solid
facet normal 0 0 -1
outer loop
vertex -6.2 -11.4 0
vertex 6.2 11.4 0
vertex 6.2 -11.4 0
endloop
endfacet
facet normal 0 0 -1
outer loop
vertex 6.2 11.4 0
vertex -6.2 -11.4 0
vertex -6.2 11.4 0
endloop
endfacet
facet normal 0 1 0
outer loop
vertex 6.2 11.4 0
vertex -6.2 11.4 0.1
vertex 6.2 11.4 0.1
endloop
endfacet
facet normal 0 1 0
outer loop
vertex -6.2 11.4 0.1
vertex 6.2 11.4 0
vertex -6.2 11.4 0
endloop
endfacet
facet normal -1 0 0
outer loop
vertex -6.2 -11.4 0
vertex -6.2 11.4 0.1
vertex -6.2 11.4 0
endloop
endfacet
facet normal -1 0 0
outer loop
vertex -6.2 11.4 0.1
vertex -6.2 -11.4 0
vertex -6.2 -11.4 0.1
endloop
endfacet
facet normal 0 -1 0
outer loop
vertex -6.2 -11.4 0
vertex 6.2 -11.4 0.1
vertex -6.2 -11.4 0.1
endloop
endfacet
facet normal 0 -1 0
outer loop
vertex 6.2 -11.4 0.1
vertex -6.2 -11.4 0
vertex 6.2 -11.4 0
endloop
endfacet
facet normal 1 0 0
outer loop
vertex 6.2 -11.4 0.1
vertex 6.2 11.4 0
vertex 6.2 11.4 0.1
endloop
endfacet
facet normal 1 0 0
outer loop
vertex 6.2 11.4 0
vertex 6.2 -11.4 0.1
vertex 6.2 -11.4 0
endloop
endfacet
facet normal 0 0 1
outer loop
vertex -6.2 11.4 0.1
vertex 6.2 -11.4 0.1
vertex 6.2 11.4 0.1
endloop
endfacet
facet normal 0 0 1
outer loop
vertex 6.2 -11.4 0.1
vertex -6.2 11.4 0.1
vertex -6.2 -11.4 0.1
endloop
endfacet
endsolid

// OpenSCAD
// file: ../p/box5-12.scad
use <../lib.scad>
function ldraw_lib__box5_12() = [
// 0 Box with 5 Faces without Any Edges
// 0 Name: box5-12.dat
// 0 Author: Chris Dee [cwdee]
// 0 !LDRAW_ORG Primitive UPDATE 2009-02
// 0 !LICENSE Licensed under CC BY 4.0 : see CAreadme.txt
// 
// 0 BFC CERTIFY CCW
  [0,"BFC","CERTIFY"],
  [0,"BFC","CCW"],
// 
// 0 !HISTORY 2009-09-03 [PTadmin] Official Update 2009-02
// 
// 
// 4 16 1 1 1 1 1 -1 -1 1 -1 -1 1 1
  [4,16,1,1,1,1,1,-1,-1,1,-1,-1,1,1],
// 4 16 -1 0 1 1 0 1 1 1 1 -1 1 1
  [4,16,-1,0,1,1,0,1,1,1,1,-1,1,1],
// 4 16 -1 0 -1 -1 0 1 -1 1 1 -1 1 -1
  [4,16,-1,0,-1,-1,0,1,-1,1,1,-1,1,-1],
// 4 16 1 0 -1 -1 0 -1 -1 1 -1 1 1 -1
  [4,16,1,0,-1,-1,0,-1,-1,1,-1,1,1,-1],
// 4 16 1 0 1 1 0 -1 1 1 -1 1 1 1
  [4,16,1,0,1,1,0,-1,1,1,-1,1,1,1],
// 0
];
module ldraw_lib__box5_12(step=0, col=false, unit=2/5, alt=false, line=0.2, solid=!$preview)
    makepoly(ldraw_lib__box5_12(), step=step, col=col, unit=unit, alt=alt, line=line, solid=solid);
ldraw_lib__box5_12(line=0.2);
// main file
use <../lib.scad>
use <../p/box5-12.scad>
function ldraw_lib__4614425b() = [
// 0 Sticker  2.7 x  1.3 with Chrome Silver Mirror
// 0 Name: 4614425b.dat
// 0 Author: Evert-Jan Boer [ejboer]
// 0 !LDRAW_ORG Part UPDATE 2020-03
// 0 !LICENSE Licensed under CC BY 4.0 : see CAreadme.txt
// 
// 0 BFC CERTIFY CCW
  [0,"BFC","CERTIFY"],
  [0,"BFC","CCW"],
// 
// 0 !KEYWORDS Set 10220, Volkswagen T1 Camper Van
// 
// 0 !HISTORY 2020-12-29 [PTadmin] Official Update 2020-03
// 
// 
// 1 16 0 -0.25 0 15.5 0 0 0 0.25 0 0 0 28.5 box5-12.dat
  [1,16,0,-0.25,0,15.5,0,0,0,0.25,0,0,0,28.5, ldraw_lib__box5_12()],
// 
// 4 383 15.5 -0.25 28.5 -15.5 -0.25 28.5 -15.5 -0.25 -28.5 15.5 -0.25 -28.5
  [4,383,15.5,-0.25,28.5,-15.5,-0.25,28.5,-15.5,-0.25,-28.5,15.5,-0.25,-28.5],
];
module ldraw_lib__4614425b(step=0, col=false, unit=2/5, alt=false, line=0.2, solid=!$preview)
    makepoly(ldraw_lib__4614425b(), step=step, col=col, unit=unit, alt=alt, line=line, solid=solid);
ldraw_lib__4614425b(line=0.2);
